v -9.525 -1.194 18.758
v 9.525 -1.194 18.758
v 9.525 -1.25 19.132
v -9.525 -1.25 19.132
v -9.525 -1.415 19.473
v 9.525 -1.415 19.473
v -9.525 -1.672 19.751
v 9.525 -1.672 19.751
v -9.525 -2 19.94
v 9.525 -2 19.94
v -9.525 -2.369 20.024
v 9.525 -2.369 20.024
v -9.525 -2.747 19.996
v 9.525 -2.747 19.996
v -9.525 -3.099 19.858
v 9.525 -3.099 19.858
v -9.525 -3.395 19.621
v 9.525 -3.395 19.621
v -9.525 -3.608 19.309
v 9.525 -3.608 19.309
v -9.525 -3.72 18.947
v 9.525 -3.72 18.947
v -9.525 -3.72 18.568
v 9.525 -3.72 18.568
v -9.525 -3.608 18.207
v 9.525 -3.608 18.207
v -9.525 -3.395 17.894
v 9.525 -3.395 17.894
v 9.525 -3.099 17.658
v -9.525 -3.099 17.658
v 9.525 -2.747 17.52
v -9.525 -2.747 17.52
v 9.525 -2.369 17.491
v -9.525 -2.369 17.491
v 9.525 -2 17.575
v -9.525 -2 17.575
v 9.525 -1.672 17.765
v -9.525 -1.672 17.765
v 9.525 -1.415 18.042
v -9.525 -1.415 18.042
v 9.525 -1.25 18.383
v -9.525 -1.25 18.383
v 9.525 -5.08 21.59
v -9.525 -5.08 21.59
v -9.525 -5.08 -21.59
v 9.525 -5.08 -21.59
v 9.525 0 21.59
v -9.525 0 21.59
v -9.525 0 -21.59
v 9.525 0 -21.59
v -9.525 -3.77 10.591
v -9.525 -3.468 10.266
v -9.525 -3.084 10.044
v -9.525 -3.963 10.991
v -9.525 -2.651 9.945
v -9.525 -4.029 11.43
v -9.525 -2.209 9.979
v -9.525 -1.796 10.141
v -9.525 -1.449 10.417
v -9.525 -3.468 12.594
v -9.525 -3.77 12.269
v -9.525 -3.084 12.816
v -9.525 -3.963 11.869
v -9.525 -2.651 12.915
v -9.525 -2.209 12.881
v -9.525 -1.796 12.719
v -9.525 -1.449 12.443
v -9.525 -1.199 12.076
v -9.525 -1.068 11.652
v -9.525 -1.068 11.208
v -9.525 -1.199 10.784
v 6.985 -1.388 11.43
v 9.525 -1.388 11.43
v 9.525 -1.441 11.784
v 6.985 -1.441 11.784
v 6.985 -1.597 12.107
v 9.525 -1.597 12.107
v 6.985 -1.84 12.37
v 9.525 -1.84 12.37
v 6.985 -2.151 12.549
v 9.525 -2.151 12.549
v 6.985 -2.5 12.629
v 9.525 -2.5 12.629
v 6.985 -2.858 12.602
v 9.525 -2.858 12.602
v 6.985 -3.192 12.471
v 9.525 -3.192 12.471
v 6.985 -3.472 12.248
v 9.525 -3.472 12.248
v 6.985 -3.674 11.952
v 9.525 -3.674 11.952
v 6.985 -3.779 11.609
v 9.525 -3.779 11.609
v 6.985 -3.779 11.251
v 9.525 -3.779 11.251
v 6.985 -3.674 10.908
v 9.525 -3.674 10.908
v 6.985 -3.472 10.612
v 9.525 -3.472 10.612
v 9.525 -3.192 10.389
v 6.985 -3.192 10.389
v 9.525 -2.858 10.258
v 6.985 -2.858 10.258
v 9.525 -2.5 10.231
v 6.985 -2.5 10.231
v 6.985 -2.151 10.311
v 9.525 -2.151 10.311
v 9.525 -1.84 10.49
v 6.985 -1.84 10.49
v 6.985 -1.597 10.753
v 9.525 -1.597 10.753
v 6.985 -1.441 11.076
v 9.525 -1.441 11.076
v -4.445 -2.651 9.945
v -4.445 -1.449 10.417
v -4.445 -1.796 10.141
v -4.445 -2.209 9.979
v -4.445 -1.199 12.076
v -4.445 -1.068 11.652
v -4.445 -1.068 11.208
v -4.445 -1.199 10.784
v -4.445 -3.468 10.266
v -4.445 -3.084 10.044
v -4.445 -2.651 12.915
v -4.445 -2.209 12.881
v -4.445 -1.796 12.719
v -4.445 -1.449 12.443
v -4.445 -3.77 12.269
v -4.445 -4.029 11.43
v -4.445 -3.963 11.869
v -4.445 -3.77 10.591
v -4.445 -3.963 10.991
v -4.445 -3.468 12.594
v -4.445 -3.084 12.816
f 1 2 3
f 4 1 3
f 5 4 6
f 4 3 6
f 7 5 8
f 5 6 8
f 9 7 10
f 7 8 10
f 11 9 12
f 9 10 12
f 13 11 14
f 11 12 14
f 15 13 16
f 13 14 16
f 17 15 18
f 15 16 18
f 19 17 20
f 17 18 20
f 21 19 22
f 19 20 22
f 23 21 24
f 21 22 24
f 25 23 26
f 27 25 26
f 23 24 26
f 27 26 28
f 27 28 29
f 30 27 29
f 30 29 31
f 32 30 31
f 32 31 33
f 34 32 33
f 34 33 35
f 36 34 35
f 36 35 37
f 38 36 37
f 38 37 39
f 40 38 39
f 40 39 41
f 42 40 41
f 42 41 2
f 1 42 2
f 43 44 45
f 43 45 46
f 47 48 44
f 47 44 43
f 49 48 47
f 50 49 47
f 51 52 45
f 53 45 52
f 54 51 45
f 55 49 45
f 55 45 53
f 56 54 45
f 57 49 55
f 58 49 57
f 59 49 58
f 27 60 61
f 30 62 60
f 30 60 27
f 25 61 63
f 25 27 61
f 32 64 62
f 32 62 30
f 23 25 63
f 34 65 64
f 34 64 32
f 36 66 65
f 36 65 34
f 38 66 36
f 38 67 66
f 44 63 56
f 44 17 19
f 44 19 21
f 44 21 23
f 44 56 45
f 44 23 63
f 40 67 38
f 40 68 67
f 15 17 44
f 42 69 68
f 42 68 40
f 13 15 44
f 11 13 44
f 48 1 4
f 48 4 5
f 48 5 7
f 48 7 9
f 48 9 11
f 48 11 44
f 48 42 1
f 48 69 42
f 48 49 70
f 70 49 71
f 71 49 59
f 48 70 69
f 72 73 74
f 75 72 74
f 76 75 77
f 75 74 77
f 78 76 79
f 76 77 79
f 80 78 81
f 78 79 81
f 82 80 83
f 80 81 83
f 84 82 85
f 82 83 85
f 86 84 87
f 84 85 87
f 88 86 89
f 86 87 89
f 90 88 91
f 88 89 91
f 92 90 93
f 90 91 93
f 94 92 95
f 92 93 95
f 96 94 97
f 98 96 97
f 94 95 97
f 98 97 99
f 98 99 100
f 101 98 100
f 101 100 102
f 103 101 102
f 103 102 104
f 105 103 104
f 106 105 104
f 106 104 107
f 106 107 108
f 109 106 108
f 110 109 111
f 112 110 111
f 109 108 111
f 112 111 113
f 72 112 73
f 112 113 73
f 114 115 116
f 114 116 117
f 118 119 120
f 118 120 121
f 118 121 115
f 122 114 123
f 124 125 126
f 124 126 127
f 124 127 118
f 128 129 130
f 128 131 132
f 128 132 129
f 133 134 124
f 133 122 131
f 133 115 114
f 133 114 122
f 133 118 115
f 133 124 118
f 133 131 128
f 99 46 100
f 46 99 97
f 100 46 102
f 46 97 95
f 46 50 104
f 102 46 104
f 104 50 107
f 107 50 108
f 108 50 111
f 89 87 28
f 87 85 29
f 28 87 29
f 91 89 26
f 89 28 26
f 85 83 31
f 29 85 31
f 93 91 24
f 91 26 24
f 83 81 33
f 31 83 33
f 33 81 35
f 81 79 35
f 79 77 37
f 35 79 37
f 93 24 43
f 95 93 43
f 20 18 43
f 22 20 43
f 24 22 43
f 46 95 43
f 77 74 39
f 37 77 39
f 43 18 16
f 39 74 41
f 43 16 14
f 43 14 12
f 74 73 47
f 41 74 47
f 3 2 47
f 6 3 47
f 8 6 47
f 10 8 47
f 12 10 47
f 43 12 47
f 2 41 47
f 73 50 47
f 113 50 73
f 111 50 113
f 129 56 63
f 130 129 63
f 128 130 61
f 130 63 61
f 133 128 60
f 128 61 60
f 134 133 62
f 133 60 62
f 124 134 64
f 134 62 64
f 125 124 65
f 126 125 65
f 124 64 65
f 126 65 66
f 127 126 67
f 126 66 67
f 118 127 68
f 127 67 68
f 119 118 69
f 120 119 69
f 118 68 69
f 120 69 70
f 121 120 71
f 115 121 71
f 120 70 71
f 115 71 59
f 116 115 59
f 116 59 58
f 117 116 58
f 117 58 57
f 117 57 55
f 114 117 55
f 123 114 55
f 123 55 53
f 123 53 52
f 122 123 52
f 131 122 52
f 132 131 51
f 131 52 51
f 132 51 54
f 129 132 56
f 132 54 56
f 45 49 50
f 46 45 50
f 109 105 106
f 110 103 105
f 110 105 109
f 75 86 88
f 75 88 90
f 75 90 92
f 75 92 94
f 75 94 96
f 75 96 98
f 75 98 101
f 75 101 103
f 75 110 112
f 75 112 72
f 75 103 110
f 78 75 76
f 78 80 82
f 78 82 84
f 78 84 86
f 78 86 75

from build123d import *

# Parameters (mm, degrees)
F0_W     = 19.05
F0_H     = 43.18
F1_DEPTH = 5.08
F2_R     = 1.202525
F3_DEPTH = 2.54
F4_R     = 1.488728
F5_DEPTH = 5.08
F6_R     = 1.27
F7_DEPTH = 25.4


with BuildPart() as f1:
    # F0 (on Front) → F1 (new body)
    with BuildSketch(Plane.XZ):
        Rectangle(F0_W, F0_H)
    extrude(amount=F1_DEPTH)

    # F2 (on face) → F3 (cut)
    with BuildSketch(Plane.YZ.offset(9.525)):
        with Locations((-2.590251, 11.43)):
            Circle(F2_R)
    extrude(amount=-F3_DEPTH, mode=Mode.SUBTRACT)

    # F4 (on face) → F5 (cut)
    with BuildSketch(Plane(origin=(-9.525, 0, 0), x_dir=(0, -1, 0), z_dir=(-1, 0, 0))):
        with Locations((2.54, 11.43)):
            Circle(F4_R)
    extrude(amount=-F5_DEPTH, mode=Mode.SUBTRACT)

    # F6 (on face) → F7 (cut)
    with BuildSketch(Plane.YZ.offset(9.525)):
        with Locations((-2.463937, 18.757666)):
            Circle(F6_R)
    extrude(amount=-F7_DEPTH, mode=Mode.SUBTRACT)


solid = f1.part
